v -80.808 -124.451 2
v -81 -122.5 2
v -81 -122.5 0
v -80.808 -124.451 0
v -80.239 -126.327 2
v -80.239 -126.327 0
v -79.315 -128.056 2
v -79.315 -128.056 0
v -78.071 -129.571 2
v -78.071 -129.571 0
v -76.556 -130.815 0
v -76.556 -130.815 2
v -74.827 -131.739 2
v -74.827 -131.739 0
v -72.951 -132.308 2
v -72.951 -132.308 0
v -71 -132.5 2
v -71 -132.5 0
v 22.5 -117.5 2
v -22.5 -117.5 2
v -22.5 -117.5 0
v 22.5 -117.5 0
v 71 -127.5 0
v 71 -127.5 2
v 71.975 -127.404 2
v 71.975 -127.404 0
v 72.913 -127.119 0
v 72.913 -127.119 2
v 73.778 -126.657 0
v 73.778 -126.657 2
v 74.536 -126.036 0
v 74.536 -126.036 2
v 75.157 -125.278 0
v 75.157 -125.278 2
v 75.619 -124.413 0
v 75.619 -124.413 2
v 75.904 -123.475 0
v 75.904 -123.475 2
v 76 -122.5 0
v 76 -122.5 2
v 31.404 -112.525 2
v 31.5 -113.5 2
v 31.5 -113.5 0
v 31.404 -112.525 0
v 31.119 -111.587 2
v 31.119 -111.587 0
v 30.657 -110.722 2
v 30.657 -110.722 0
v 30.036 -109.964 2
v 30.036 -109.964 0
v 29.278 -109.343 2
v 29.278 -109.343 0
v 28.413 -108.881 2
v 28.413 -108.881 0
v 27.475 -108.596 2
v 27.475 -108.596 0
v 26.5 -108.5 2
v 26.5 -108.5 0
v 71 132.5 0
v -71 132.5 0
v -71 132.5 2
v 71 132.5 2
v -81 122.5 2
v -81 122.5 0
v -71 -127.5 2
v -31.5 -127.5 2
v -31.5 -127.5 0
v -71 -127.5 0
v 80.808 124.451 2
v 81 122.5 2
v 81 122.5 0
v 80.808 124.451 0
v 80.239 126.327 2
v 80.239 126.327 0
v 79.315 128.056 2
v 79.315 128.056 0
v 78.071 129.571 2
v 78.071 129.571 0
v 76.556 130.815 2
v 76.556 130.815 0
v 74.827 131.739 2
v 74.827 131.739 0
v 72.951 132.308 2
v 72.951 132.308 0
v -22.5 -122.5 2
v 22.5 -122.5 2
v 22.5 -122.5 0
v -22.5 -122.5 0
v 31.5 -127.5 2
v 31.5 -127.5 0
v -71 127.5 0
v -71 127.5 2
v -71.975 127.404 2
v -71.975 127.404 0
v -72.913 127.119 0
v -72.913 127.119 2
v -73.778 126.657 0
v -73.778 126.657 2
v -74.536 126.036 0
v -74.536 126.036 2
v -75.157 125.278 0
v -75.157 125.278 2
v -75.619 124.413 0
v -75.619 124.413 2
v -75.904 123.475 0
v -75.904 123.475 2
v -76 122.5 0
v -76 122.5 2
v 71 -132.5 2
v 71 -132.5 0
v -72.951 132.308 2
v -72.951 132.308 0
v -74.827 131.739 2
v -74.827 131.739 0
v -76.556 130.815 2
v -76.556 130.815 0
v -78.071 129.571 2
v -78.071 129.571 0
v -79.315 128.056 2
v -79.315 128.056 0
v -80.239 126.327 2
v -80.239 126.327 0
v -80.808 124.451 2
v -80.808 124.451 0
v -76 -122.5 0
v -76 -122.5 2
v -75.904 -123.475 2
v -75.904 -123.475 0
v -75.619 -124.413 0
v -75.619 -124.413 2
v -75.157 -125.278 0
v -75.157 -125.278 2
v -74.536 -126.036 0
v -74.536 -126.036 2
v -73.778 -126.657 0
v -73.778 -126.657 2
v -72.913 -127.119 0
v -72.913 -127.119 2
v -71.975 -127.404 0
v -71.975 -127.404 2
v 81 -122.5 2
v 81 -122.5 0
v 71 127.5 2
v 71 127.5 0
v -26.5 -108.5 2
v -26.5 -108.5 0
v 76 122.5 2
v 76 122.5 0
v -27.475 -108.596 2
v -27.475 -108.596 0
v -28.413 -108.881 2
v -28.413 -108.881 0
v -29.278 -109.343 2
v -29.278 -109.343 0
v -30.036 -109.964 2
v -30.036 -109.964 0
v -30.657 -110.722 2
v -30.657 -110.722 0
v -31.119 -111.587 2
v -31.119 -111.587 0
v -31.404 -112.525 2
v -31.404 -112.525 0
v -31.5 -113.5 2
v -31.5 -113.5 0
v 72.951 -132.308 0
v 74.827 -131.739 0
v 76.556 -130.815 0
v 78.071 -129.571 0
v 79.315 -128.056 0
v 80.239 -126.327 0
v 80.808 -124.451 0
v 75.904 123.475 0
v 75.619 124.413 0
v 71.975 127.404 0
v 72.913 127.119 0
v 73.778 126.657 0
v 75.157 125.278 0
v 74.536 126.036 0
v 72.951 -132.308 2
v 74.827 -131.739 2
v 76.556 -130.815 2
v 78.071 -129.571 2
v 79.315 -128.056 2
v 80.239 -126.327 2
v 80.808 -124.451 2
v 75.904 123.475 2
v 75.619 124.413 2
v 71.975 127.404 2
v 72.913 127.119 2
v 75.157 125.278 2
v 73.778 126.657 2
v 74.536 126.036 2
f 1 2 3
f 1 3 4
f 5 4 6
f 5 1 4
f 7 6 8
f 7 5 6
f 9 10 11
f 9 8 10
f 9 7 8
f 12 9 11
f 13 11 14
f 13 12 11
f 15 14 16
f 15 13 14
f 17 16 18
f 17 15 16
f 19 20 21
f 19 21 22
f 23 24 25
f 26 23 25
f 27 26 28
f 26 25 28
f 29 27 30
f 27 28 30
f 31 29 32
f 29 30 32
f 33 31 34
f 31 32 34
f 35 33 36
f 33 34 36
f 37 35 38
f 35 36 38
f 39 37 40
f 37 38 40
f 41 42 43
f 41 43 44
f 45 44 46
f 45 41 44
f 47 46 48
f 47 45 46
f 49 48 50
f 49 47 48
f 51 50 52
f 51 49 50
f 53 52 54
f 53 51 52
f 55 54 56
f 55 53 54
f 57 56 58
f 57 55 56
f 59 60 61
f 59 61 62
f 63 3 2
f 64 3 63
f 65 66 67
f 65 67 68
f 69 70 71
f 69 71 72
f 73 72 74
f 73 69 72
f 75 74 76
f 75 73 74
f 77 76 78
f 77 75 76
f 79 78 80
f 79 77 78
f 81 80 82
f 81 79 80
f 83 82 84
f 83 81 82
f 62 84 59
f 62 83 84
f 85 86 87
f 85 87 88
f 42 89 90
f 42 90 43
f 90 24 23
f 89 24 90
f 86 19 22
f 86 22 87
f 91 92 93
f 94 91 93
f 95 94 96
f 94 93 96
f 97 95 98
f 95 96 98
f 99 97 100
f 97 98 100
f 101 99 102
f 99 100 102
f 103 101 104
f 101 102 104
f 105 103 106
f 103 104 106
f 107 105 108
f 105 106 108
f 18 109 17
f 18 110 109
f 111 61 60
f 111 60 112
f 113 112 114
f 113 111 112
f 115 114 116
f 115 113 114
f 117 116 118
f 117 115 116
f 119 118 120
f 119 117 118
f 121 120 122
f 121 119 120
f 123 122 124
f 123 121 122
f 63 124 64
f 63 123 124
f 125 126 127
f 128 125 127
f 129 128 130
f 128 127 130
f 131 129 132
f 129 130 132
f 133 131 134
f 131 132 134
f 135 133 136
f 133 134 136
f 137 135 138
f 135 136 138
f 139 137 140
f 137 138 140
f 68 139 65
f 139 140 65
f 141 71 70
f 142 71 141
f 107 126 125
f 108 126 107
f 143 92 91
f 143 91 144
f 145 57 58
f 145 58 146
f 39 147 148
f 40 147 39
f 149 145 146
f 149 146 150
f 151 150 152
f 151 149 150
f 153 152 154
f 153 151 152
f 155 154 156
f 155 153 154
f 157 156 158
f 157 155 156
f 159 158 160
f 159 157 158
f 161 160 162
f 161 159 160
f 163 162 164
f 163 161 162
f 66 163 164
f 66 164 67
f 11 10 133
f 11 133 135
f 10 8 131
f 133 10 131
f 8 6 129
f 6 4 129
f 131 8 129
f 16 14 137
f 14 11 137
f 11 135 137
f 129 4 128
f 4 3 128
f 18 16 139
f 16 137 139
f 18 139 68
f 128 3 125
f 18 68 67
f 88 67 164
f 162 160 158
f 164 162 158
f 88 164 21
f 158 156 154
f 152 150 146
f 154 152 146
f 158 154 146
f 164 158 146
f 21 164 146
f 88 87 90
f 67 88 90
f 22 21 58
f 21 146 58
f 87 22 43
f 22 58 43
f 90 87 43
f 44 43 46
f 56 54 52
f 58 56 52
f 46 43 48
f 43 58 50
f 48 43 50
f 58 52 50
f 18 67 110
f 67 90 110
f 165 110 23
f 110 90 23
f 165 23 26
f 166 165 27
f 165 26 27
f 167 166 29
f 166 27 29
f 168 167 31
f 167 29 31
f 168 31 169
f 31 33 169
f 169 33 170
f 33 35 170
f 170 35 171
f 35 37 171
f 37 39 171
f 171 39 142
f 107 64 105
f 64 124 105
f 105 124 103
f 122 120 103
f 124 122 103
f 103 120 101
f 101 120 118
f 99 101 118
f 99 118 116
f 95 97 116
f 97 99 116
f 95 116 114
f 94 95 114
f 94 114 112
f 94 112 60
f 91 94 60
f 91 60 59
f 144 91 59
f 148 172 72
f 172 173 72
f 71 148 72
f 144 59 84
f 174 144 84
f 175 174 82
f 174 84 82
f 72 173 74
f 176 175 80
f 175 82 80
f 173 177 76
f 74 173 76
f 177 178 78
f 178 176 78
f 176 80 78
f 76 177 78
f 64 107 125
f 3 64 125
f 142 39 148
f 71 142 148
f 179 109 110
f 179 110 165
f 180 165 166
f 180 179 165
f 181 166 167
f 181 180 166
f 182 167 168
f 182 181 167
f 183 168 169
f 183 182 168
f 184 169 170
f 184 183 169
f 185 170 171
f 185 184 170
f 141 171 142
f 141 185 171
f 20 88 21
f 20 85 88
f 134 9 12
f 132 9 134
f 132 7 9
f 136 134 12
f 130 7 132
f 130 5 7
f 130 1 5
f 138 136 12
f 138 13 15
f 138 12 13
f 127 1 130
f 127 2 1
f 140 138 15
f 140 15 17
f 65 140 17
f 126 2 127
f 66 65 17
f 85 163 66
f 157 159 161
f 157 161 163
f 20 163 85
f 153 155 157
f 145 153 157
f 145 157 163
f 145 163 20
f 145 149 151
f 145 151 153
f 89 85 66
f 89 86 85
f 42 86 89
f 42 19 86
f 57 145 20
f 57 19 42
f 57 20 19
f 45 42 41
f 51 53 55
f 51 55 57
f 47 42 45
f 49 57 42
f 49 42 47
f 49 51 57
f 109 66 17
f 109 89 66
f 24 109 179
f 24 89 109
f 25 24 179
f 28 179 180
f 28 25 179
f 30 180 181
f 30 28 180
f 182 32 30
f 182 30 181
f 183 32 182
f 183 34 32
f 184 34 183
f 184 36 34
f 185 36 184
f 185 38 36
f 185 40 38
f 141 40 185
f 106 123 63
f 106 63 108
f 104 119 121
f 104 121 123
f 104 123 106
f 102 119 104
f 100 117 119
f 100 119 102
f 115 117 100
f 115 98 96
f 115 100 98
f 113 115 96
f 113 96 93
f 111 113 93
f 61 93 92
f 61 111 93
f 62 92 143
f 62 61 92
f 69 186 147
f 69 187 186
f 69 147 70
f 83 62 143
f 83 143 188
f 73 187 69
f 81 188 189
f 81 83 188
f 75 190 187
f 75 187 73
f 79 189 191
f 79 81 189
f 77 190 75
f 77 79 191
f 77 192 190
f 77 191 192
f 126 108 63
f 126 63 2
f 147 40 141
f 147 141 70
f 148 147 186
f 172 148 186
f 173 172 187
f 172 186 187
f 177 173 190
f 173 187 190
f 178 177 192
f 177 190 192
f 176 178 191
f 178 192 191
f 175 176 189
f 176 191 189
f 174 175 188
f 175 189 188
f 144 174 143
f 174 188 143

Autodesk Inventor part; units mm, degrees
ref_plane "YZ Plane" through (0, 0, 0) normal (1, 0, 0) x (0, 1, 0)
ref_plane "XZ Plane" through (0, 0, 0) normal (0, 1, 0) x (-1, 0, 0)
ref_plane "XY Plane" through (0, 0, 0) normal (0, 0, 1) x (1, 0, 0)
sketch "Skizze1" plane through (0, 0, 0) normal (0, 0, 1) x (1, 0, 0)
  line L0 (-81, 132.5) -> (81, 132.5)
  line L1 (81, 132.5) -> (81, -132.5)
  line L2 (81, -132.5) -> (-81, -132.5)
  line L3 (-81, -132.5) -> (-81, 132.5)
  line L4 (-81, 132.5) -> (81, -132.5) construction
  line L5 (81, 132.5) -> (-81, -132.5) construction
  point P0 (0, 0)
  dimension "d0" = 162
  dimension "d1" = 265
extrude "Grobblech1" add sketch "Skizze1" along normal blind 2
fillet "Eckenrundung1" radius 10 4 edges at (-81, 132.5, 1) (81, 132.5, 1) (81, -132.5, 1) (-81, -132.5, 1)
sketch "Skizze2" plane through (0, 0, 2) normal (0, 0, 1) x (1, 0, 0)
  arc A0 (-81, -122.5) -> (-71, -132.5) centre (-71, -122.5) ccw projected
  line L0 (71, -132.5) -> (-71, -132.5) projected
  arc A1 (71, -132.5) -> (81, -122.5) centre (71, -122.5) ccw projected
  line L1 (81, 122.5) -> (81, -122.5) projected
  arc A2 (81, 122.5) -> (71, 132.5) centre (71, 122.5) ccw projected
  line L2 (-71, 132.5) -> (71, 132.5) projected
  arc A3 (-71, 132.5) -> (-81, 122.5) centre (-71, 122.5) ccw projected
  line L3 (-81, -122.5) -> (-81, 122.5) projected
  arc A4 (76, 122.5) -> (71, 127.5) centre (71, 122.5) ccw
  line L4 (76, 122.5) -> (76, -122.5)
  arc A5 (71, -127.5) -> (76, -122.5) centre (71, -122.5) ccw
  line L5 (71, -127.5) -> (-71, -127.5)
  arc A6 (-76, -122.5) -> (-71, -127.5) centre (-71, -122.5) ccw
  line L6 (-76, -122.5) -> (-76, 122.5)
  arc A7 (-71, 127.5) -> (-76, 122.5) centre (-71, 122.5) ccw
  line L7 (-71, 127.5) -> (71, 127.5)
  line L8 (-135.5785, 0) -> (231.9734, 0) projected
  line L9 (0, -191.312) -> (0, 205.8747) projected
  line L10 (-22.5, -117.5) -> (22.5, -117.5)
  line L11 (22.5, -117.5) -> (22.5, -122.5)
  line L12 (22.5, -122.5) -> (-22.5, -122.5)
  line L13 (-22.5, -122.5) -> (-22.5, -117.5)
  line L14 (30, -127.5) -> (30, -108.5)
  line L15 (30, -108.5) -> (-30, -108.5)
  line L16 (-30, -108.5) -> (-30, -127.5)
  line L17 (-53.5621, 127.5) -> (-20.4158, 127.5) construction
  point P0 (0, 0)
  dimension "d4" = 5
  dimension "d7" = 45
  dimension "d8" = 5
  dimension "d10" = 9
  dimension "d70" = 10
  dimension "d71" = 60
extrude "Ausklinkung1" cut sketch "Skizze2" against normal blind 2 contours L12 L13 L10 L9 | L9 L10 L11 L12
sketch "Skizze5" plane through (0, 0, 2) normal (0, 0, 1) x (1, 0, 0)
  line L0 (-22.5, -122.5) -> (-22.5, -117.5) projected
  line L1 (-22.5, -117.5) -> (22.5, -117.5) projected
  line L2 (22.5, -117.5) -> (22.5, -122.5) projected
  line L3 (22.5, -122.5) -> (-22.5, -122.5) projected
  arc A0 (-81, -122.5) -> (-71, -132.5) centre (-71, -122.5) ccw projected
  line L4 (71, -132.5) -> (-71, -132.5) projected
  arc A1 (71, -132.5) -> (81, -122.5) centre (71, -122.5) ccw projected
  line L5 (81, 122.5) -> (81, -122.5) projected
  arc A2 (81, 122.5) -> (71, 132.5) centre (71, 122.5) ccw projected
  line L6 (-71, 132.5) -> (71, 132.5) projected
  arc A3 (-71, 132.5) -> (-81, 122.5) centre (-71, 122.5) ccw projected
  line L7 (-81, -122.5) -> (-81, 122.5) projected
  arc A4 (-71, 127.5) -> (-76, 122.5) centre (-71, 122.5) ccw
  line L8 (-71, 127.5) -> (71, 127.5)
  arc A5 (76, 122.5) -> (71, 127.5) centre (71, 122.5) ccw
  line L9 (76, 122.5) -> (76, -122.5)
  arc A6 (71, -127.5) -> (76, -122.5) centre (71, -122.5) ccw
  line L10 (71, -127.5) -> (-71, -127.5)
  arc A7 (-76, -122.5) -> (-71, -127.5) centre (-71, -122.5) ccw
  line L11 (-76, -122.5) -> (-76, 122.5)
  line L12 (26.5, -108.5) -> (-26.5, -108.5)
  line L13 (-31.5, -113.5) -> (-31.5, -132.5)
  line L14 (-31.5, -132.5) -> (31.5, -132.5)
  line L15 (31.5, -132.5) -> (31.5, -113.5)
  line L16 (-81, -122.5) -> (-81, 122.5) projected
  line L17 (31.5, -127.5) -> (-31.5, -127.5)
  line L18 (-31.5, -127.5) -> (-31.5, -113.5)
  line L19 (-26.5, -108.5) -> (26.5, -108.5)
  line L20 (31.5, -113.5) -> (31.5, -127.5)
  arc A8 (-26.5, -108.5) -> (-31.5, -113.5) centre (-26.5, -113.5) ccw
  arc A9 (31.5, -113.5) -> (26.5, -108.5) centre (26.5, -113.5) ccw
  line L21 (71, -132.5) -> (-71, -132.5) projected
  point P0 (0, 0)
  point P1 (31.5, -108.5)
  dimension "d37" = 5
  dimension "d38" = 9
  dimension "d41" = 5
extrude "Ausklinkung2" cut sketch "Skizze5" against normal blind 2 contours L10 A7 L11 A4 L8 A5 L9 A6 L15 A9 L12 A8 L13
equation "\"d17\" = Stärke"
equation "\"d39\" = Stärke"
equation "\"d2\" = Stärke"
equation "\"Biegeradius\" = Stärke"
equation "\"BreiteBiegungsfreistellung\" = Stärke"
equation "\"TiefeBiegungsfreistellung\" = 0.5 * Stärke"
equation "\"GrößeEckenfreistellung\" = 4 * Stärke"
equation "\"MinimalRest\" = 2 * Stärke"
equation "\"Übergangsradius\" = Biegeradius"
equation "\"JacobiRadiusGröße\" = Biegeradius"
equation "\"Abstandsgröße\" = Stärke"
equation "\"Stärke\" = 2"
properties part number "Rost_Basis"
